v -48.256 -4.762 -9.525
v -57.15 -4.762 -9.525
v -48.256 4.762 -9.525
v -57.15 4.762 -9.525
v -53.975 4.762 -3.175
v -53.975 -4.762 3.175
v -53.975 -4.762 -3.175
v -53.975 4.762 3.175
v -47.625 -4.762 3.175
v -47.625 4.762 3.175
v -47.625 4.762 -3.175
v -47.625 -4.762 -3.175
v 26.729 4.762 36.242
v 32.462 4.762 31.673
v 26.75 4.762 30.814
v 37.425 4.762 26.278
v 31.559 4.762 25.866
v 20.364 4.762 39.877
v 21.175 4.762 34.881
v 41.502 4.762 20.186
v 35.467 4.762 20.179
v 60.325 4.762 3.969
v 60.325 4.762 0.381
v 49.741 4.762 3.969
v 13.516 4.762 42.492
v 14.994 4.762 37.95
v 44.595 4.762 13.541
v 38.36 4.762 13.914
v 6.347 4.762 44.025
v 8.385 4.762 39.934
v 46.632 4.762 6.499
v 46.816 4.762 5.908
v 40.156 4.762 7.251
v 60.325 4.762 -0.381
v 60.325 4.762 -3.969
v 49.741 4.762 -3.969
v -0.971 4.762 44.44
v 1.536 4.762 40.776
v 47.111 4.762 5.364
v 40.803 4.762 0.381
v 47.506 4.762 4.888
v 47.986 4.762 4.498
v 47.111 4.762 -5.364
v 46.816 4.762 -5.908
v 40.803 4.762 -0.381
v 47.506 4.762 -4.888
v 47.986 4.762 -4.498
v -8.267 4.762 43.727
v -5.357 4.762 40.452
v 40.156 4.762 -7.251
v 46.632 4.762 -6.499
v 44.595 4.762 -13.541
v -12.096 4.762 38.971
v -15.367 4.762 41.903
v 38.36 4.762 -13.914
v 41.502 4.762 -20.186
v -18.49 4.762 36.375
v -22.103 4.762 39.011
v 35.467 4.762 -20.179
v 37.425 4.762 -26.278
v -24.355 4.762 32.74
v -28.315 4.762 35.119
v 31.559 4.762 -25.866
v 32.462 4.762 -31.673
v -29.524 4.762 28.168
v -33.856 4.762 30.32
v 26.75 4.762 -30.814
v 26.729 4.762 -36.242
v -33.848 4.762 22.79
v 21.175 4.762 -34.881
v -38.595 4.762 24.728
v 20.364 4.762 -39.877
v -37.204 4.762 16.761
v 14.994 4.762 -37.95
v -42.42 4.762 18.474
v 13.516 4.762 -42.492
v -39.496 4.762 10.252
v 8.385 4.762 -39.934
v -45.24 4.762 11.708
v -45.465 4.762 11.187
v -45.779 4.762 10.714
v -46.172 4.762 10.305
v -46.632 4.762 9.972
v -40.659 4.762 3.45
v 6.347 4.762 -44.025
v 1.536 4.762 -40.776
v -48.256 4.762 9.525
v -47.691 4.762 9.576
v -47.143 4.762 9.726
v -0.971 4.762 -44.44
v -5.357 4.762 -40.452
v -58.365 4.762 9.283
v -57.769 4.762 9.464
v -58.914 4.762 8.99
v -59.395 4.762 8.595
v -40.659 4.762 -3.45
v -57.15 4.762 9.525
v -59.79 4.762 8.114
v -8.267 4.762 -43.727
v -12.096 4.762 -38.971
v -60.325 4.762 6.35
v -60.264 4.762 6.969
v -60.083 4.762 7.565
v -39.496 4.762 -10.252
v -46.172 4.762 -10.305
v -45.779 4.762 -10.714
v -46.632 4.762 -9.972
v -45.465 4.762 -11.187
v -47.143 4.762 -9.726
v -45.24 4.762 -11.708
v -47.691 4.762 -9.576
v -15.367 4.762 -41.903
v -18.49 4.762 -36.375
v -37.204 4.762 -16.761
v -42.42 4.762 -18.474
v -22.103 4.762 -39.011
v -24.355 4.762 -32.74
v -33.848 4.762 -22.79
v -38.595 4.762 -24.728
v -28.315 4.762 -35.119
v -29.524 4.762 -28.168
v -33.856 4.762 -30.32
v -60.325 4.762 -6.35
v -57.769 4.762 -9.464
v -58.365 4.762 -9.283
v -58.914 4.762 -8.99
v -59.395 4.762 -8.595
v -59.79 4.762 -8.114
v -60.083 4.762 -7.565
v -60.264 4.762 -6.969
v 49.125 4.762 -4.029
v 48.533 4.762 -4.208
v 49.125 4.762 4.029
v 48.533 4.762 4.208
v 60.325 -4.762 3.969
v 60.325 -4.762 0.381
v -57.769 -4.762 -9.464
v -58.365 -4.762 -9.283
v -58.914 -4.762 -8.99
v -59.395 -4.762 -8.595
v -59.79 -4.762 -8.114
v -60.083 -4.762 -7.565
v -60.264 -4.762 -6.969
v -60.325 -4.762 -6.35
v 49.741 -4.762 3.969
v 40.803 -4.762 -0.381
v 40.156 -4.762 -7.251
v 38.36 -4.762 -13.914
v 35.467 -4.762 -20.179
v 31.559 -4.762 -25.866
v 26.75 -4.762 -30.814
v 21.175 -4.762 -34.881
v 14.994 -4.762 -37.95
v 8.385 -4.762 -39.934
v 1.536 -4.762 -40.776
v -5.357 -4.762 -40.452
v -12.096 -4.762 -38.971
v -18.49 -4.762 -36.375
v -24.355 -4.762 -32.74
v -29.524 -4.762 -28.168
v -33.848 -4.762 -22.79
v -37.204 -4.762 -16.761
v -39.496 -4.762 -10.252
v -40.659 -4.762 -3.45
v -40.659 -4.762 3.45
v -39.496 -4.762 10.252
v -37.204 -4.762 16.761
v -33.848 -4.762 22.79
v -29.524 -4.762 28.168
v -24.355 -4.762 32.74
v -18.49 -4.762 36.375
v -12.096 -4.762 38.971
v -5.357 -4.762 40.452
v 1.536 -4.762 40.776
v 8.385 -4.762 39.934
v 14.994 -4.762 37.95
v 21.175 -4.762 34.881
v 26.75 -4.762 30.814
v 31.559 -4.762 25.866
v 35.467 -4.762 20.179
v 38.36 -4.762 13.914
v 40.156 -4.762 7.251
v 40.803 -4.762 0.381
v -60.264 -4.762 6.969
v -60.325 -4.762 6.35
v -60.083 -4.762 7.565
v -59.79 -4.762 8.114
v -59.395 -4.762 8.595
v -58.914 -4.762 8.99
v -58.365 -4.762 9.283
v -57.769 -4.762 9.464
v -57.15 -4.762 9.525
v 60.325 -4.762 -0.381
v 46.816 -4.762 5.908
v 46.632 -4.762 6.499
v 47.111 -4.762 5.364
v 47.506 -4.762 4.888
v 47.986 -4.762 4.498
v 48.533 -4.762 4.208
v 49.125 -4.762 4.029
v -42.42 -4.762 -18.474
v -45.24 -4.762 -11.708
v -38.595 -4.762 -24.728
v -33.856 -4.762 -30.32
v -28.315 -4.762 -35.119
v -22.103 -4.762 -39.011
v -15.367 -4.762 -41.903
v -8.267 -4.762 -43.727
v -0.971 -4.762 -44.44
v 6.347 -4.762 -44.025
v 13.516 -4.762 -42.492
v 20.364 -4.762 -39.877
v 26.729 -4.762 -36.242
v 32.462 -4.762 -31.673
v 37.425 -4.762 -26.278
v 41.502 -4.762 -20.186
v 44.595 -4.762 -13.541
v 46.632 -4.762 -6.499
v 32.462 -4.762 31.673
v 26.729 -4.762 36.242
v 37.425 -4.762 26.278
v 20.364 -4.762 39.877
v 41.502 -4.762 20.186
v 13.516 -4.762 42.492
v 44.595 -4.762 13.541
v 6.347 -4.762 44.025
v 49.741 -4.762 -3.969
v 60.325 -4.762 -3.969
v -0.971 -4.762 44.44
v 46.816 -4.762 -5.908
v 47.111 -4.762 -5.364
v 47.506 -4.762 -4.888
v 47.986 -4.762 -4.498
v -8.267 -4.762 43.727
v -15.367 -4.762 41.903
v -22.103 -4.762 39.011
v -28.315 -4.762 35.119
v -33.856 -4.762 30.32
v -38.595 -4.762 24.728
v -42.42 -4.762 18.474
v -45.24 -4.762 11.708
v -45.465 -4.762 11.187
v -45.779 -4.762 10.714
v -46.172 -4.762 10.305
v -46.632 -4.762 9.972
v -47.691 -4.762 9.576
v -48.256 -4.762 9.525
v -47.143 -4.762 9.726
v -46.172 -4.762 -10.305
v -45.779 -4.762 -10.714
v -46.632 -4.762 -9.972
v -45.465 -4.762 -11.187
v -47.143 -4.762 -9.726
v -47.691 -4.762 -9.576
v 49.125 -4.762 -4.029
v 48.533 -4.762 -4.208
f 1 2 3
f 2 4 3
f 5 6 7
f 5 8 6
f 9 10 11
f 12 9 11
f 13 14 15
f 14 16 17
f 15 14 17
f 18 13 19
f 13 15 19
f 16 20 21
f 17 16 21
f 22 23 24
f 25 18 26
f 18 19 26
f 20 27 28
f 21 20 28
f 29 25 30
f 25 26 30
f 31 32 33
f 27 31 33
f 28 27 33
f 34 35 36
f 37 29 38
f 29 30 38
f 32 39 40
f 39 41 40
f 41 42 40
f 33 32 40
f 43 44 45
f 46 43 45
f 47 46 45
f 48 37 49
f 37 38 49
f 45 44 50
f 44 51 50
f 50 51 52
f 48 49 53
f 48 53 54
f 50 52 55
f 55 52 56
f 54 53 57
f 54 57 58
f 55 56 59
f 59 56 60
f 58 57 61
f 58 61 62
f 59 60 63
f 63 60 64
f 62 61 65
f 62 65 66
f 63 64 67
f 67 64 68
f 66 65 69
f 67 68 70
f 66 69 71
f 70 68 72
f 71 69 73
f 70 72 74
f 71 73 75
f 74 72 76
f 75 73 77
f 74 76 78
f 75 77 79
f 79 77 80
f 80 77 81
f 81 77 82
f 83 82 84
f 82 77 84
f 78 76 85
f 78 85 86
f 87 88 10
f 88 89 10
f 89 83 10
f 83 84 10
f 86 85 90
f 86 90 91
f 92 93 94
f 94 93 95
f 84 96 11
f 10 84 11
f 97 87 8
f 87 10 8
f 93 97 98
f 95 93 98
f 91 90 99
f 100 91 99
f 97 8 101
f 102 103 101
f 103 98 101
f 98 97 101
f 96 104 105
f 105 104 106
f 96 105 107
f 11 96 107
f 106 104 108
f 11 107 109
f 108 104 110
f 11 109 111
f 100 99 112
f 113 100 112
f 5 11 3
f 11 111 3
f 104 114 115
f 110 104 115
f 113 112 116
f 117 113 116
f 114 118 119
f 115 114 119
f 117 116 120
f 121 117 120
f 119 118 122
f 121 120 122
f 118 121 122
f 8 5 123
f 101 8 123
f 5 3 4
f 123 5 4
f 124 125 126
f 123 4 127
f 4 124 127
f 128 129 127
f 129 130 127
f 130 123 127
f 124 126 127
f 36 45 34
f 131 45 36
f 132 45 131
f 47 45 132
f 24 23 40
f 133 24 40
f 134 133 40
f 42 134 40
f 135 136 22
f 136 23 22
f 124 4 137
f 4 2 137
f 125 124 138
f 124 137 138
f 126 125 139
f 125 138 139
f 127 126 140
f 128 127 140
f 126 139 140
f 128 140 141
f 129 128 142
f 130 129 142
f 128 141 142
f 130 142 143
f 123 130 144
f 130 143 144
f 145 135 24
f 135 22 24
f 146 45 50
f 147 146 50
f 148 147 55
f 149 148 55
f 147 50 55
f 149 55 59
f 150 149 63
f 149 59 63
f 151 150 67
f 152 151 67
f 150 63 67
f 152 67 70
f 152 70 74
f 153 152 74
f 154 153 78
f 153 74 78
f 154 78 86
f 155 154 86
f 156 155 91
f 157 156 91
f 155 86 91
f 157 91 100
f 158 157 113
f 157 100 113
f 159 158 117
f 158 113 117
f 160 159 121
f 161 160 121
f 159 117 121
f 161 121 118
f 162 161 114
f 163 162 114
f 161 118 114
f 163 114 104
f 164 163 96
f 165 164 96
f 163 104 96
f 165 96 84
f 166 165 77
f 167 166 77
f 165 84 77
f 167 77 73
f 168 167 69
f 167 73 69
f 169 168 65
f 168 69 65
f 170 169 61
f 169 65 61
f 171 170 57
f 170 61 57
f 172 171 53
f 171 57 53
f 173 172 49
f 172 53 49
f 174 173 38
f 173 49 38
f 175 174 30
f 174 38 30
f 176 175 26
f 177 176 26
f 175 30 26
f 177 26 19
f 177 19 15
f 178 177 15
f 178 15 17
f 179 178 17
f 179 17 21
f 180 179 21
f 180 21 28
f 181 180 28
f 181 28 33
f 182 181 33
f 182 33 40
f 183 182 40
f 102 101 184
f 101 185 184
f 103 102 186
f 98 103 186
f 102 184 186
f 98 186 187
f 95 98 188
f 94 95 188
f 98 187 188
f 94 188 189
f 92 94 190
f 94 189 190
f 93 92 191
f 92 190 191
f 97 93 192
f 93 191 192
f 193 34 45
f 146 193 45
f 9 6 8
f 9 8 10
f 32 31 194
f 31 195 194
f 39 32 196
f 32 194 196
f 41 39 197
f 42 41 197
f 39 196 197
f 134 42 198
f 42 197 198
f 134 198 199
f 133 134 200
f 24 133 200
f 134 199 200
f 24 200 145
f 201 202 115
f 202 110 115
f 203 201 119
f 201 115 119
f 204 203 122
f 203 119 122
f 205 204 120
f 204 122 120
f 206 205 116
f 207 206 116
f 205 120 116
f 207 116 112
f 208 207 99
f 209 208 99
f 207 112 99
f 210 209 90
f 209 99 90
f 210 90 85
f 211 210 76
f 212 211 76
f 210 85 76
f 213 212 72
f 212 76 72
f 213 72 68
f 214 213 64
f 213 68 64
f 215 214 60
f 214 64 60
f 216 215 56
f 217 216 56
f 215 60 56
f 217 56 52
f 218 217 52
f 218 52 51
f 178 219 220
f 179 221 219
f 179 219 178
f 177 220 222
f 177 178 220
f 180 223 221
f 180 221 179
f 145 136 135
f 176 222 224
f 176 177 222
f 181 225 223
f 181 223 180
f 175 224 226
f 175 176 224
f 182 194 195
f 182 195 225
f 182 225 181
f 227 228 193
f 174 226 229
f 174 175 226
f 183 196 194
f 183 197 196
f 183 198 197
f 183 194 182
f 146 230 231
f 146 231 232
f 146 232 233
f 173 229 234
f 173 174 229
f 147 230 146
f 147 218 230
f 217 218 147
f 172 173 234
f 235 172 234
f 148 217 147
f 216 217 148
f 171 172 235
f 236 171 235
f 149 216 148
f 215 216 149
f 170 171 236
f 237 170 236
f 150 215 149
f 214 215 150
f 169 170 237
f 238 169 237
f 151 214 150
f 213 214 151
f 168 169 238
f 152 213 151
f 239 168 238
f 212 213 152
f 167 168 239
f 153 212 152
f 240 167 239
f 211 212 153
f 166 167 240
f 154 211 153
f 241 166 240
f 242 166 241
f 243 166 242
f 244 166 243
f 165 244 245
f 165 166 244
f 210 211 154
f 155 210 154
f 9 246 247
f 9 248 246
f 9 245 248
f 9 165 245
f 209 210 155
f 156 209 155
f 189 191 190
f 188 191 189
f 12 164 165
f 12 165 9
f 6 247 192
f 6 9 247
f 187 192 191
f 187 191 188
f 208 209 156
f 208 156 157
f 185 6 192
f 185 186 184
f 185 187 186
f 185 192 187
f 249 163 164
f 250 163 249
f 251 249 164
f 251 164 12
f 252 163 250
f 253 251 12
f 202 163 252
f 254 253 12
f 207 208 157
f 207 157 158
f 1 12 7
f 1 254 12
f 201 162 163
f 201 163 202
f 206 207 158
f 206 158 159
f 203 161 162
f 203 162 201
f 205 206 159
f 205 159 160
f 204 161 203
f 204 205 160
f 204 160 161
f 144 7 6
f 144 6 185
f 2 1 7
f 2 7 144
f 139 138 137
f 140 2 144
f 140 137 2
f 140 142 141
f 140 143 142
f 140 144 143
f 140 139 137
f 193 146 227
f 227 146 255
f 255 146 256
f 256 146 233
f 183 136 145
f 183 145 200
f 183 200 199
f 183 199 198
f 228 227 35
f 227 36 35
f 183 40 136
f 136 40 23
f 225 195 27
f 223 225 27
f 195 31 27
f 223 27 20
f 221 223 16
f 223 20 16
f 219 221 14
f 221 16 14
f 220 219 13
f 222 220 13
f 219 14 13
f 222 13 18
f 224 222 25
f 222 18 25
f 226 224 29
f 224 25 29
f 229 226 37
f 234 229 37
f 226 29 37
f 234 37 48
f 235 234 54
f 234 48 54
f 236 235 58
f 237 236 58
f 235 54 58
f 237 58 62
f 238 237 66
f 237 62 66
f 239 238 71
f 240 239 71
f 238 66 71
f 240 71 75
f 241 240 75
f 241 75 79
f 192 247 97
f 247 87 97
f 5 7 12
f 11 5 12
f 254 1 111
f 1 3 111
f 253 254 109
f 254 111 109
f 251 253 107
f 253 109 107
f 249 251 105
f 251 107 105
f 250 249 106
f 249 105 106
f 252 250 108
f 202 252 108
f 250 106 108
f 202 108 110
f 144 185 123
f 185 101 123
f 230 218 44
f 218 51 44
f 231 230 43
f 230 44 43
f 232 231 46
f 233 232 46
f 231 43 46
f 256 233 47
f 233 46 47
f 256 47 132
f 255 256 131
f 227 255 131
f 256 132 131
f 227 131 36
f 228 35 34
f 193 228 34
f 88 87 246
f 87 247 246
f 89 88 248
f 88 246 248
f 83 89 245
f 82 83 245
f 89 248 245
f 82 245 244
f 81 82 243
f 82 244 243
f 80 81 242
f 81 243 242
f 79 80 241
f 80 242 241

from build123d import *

# Parameters (mm, degrees)
SKETCH1_W           = 6.35
SKETCH1_H           = 6.35
BOSS_EXTRUDE1_DEPTH = 4.7625
FILLET1_R           = 3.175


with BuildPart() as part:
    # Sketch1 → Boss-Extrude1 (new body, symmetric)
    with BuildSketch(Plane(origin=(0, 0, 0), x_dir=(1, 0, 0), z_dir=(0, 1, 0))):
        with BuildLine():
            Line((40.80332125, -0.381), (60.325, -0.381))
            Line((60.325, -0.381), (60.325, -3.96875))
            Line((60.325, -3.96875), (47.086170591, -3.96875))
            ThreePointArc((47.086170591, -3.96875), (2.8406806, -44.365205708), (-45.900442536, -9.525))
            Line((-45.900442536, -9.525), (-60.325, -9.525))
            Line((-60.325, -9.525), (-60.325, 9.525))
            Line((-60.325, 9.525), (-45.900442536, 9.525))
            ThreePointArc((-45.900442536, 9.525), (2.8406806, 44.365205708), (47.086170591, 3.96875))
            Line((47.086170591, 3.96875), (60.325, 3.96875))
            Line((60.325, 3.96875), (60.325, 0.381))
            Line((60.325, 0.381), (40.80332125, 0.381))
            ThreePointArc((40.80332125, 0.381), (-40.8051, 0), (40.80332125, -0.381))
        make_face()
        with Locations((-50.8, 0)):
            Rectangle(SKETCH1_W, SKETCH1_H, mode=Mode.SUBTRACT)
    extrude(amount=BOSS_EXTRUDE1_DEPTH, both=True)

    # Fillet1
    fillet1_edges = [part.edges().sort_by_distance(p)[0] for p in [
        (-45.900442536, 0, 9.525),
        (-60.325, 0, 9.525),
        (-60.325, 0, -9.525),
        (-45.900442536, 0, -9.525),
        (47.086170591, 0, -3.96875),
        (47.086170591, 0, 3.96875),
    ]]
    fillet(fillet1_edges, radius=FILLET1_R)


solid = part.part
